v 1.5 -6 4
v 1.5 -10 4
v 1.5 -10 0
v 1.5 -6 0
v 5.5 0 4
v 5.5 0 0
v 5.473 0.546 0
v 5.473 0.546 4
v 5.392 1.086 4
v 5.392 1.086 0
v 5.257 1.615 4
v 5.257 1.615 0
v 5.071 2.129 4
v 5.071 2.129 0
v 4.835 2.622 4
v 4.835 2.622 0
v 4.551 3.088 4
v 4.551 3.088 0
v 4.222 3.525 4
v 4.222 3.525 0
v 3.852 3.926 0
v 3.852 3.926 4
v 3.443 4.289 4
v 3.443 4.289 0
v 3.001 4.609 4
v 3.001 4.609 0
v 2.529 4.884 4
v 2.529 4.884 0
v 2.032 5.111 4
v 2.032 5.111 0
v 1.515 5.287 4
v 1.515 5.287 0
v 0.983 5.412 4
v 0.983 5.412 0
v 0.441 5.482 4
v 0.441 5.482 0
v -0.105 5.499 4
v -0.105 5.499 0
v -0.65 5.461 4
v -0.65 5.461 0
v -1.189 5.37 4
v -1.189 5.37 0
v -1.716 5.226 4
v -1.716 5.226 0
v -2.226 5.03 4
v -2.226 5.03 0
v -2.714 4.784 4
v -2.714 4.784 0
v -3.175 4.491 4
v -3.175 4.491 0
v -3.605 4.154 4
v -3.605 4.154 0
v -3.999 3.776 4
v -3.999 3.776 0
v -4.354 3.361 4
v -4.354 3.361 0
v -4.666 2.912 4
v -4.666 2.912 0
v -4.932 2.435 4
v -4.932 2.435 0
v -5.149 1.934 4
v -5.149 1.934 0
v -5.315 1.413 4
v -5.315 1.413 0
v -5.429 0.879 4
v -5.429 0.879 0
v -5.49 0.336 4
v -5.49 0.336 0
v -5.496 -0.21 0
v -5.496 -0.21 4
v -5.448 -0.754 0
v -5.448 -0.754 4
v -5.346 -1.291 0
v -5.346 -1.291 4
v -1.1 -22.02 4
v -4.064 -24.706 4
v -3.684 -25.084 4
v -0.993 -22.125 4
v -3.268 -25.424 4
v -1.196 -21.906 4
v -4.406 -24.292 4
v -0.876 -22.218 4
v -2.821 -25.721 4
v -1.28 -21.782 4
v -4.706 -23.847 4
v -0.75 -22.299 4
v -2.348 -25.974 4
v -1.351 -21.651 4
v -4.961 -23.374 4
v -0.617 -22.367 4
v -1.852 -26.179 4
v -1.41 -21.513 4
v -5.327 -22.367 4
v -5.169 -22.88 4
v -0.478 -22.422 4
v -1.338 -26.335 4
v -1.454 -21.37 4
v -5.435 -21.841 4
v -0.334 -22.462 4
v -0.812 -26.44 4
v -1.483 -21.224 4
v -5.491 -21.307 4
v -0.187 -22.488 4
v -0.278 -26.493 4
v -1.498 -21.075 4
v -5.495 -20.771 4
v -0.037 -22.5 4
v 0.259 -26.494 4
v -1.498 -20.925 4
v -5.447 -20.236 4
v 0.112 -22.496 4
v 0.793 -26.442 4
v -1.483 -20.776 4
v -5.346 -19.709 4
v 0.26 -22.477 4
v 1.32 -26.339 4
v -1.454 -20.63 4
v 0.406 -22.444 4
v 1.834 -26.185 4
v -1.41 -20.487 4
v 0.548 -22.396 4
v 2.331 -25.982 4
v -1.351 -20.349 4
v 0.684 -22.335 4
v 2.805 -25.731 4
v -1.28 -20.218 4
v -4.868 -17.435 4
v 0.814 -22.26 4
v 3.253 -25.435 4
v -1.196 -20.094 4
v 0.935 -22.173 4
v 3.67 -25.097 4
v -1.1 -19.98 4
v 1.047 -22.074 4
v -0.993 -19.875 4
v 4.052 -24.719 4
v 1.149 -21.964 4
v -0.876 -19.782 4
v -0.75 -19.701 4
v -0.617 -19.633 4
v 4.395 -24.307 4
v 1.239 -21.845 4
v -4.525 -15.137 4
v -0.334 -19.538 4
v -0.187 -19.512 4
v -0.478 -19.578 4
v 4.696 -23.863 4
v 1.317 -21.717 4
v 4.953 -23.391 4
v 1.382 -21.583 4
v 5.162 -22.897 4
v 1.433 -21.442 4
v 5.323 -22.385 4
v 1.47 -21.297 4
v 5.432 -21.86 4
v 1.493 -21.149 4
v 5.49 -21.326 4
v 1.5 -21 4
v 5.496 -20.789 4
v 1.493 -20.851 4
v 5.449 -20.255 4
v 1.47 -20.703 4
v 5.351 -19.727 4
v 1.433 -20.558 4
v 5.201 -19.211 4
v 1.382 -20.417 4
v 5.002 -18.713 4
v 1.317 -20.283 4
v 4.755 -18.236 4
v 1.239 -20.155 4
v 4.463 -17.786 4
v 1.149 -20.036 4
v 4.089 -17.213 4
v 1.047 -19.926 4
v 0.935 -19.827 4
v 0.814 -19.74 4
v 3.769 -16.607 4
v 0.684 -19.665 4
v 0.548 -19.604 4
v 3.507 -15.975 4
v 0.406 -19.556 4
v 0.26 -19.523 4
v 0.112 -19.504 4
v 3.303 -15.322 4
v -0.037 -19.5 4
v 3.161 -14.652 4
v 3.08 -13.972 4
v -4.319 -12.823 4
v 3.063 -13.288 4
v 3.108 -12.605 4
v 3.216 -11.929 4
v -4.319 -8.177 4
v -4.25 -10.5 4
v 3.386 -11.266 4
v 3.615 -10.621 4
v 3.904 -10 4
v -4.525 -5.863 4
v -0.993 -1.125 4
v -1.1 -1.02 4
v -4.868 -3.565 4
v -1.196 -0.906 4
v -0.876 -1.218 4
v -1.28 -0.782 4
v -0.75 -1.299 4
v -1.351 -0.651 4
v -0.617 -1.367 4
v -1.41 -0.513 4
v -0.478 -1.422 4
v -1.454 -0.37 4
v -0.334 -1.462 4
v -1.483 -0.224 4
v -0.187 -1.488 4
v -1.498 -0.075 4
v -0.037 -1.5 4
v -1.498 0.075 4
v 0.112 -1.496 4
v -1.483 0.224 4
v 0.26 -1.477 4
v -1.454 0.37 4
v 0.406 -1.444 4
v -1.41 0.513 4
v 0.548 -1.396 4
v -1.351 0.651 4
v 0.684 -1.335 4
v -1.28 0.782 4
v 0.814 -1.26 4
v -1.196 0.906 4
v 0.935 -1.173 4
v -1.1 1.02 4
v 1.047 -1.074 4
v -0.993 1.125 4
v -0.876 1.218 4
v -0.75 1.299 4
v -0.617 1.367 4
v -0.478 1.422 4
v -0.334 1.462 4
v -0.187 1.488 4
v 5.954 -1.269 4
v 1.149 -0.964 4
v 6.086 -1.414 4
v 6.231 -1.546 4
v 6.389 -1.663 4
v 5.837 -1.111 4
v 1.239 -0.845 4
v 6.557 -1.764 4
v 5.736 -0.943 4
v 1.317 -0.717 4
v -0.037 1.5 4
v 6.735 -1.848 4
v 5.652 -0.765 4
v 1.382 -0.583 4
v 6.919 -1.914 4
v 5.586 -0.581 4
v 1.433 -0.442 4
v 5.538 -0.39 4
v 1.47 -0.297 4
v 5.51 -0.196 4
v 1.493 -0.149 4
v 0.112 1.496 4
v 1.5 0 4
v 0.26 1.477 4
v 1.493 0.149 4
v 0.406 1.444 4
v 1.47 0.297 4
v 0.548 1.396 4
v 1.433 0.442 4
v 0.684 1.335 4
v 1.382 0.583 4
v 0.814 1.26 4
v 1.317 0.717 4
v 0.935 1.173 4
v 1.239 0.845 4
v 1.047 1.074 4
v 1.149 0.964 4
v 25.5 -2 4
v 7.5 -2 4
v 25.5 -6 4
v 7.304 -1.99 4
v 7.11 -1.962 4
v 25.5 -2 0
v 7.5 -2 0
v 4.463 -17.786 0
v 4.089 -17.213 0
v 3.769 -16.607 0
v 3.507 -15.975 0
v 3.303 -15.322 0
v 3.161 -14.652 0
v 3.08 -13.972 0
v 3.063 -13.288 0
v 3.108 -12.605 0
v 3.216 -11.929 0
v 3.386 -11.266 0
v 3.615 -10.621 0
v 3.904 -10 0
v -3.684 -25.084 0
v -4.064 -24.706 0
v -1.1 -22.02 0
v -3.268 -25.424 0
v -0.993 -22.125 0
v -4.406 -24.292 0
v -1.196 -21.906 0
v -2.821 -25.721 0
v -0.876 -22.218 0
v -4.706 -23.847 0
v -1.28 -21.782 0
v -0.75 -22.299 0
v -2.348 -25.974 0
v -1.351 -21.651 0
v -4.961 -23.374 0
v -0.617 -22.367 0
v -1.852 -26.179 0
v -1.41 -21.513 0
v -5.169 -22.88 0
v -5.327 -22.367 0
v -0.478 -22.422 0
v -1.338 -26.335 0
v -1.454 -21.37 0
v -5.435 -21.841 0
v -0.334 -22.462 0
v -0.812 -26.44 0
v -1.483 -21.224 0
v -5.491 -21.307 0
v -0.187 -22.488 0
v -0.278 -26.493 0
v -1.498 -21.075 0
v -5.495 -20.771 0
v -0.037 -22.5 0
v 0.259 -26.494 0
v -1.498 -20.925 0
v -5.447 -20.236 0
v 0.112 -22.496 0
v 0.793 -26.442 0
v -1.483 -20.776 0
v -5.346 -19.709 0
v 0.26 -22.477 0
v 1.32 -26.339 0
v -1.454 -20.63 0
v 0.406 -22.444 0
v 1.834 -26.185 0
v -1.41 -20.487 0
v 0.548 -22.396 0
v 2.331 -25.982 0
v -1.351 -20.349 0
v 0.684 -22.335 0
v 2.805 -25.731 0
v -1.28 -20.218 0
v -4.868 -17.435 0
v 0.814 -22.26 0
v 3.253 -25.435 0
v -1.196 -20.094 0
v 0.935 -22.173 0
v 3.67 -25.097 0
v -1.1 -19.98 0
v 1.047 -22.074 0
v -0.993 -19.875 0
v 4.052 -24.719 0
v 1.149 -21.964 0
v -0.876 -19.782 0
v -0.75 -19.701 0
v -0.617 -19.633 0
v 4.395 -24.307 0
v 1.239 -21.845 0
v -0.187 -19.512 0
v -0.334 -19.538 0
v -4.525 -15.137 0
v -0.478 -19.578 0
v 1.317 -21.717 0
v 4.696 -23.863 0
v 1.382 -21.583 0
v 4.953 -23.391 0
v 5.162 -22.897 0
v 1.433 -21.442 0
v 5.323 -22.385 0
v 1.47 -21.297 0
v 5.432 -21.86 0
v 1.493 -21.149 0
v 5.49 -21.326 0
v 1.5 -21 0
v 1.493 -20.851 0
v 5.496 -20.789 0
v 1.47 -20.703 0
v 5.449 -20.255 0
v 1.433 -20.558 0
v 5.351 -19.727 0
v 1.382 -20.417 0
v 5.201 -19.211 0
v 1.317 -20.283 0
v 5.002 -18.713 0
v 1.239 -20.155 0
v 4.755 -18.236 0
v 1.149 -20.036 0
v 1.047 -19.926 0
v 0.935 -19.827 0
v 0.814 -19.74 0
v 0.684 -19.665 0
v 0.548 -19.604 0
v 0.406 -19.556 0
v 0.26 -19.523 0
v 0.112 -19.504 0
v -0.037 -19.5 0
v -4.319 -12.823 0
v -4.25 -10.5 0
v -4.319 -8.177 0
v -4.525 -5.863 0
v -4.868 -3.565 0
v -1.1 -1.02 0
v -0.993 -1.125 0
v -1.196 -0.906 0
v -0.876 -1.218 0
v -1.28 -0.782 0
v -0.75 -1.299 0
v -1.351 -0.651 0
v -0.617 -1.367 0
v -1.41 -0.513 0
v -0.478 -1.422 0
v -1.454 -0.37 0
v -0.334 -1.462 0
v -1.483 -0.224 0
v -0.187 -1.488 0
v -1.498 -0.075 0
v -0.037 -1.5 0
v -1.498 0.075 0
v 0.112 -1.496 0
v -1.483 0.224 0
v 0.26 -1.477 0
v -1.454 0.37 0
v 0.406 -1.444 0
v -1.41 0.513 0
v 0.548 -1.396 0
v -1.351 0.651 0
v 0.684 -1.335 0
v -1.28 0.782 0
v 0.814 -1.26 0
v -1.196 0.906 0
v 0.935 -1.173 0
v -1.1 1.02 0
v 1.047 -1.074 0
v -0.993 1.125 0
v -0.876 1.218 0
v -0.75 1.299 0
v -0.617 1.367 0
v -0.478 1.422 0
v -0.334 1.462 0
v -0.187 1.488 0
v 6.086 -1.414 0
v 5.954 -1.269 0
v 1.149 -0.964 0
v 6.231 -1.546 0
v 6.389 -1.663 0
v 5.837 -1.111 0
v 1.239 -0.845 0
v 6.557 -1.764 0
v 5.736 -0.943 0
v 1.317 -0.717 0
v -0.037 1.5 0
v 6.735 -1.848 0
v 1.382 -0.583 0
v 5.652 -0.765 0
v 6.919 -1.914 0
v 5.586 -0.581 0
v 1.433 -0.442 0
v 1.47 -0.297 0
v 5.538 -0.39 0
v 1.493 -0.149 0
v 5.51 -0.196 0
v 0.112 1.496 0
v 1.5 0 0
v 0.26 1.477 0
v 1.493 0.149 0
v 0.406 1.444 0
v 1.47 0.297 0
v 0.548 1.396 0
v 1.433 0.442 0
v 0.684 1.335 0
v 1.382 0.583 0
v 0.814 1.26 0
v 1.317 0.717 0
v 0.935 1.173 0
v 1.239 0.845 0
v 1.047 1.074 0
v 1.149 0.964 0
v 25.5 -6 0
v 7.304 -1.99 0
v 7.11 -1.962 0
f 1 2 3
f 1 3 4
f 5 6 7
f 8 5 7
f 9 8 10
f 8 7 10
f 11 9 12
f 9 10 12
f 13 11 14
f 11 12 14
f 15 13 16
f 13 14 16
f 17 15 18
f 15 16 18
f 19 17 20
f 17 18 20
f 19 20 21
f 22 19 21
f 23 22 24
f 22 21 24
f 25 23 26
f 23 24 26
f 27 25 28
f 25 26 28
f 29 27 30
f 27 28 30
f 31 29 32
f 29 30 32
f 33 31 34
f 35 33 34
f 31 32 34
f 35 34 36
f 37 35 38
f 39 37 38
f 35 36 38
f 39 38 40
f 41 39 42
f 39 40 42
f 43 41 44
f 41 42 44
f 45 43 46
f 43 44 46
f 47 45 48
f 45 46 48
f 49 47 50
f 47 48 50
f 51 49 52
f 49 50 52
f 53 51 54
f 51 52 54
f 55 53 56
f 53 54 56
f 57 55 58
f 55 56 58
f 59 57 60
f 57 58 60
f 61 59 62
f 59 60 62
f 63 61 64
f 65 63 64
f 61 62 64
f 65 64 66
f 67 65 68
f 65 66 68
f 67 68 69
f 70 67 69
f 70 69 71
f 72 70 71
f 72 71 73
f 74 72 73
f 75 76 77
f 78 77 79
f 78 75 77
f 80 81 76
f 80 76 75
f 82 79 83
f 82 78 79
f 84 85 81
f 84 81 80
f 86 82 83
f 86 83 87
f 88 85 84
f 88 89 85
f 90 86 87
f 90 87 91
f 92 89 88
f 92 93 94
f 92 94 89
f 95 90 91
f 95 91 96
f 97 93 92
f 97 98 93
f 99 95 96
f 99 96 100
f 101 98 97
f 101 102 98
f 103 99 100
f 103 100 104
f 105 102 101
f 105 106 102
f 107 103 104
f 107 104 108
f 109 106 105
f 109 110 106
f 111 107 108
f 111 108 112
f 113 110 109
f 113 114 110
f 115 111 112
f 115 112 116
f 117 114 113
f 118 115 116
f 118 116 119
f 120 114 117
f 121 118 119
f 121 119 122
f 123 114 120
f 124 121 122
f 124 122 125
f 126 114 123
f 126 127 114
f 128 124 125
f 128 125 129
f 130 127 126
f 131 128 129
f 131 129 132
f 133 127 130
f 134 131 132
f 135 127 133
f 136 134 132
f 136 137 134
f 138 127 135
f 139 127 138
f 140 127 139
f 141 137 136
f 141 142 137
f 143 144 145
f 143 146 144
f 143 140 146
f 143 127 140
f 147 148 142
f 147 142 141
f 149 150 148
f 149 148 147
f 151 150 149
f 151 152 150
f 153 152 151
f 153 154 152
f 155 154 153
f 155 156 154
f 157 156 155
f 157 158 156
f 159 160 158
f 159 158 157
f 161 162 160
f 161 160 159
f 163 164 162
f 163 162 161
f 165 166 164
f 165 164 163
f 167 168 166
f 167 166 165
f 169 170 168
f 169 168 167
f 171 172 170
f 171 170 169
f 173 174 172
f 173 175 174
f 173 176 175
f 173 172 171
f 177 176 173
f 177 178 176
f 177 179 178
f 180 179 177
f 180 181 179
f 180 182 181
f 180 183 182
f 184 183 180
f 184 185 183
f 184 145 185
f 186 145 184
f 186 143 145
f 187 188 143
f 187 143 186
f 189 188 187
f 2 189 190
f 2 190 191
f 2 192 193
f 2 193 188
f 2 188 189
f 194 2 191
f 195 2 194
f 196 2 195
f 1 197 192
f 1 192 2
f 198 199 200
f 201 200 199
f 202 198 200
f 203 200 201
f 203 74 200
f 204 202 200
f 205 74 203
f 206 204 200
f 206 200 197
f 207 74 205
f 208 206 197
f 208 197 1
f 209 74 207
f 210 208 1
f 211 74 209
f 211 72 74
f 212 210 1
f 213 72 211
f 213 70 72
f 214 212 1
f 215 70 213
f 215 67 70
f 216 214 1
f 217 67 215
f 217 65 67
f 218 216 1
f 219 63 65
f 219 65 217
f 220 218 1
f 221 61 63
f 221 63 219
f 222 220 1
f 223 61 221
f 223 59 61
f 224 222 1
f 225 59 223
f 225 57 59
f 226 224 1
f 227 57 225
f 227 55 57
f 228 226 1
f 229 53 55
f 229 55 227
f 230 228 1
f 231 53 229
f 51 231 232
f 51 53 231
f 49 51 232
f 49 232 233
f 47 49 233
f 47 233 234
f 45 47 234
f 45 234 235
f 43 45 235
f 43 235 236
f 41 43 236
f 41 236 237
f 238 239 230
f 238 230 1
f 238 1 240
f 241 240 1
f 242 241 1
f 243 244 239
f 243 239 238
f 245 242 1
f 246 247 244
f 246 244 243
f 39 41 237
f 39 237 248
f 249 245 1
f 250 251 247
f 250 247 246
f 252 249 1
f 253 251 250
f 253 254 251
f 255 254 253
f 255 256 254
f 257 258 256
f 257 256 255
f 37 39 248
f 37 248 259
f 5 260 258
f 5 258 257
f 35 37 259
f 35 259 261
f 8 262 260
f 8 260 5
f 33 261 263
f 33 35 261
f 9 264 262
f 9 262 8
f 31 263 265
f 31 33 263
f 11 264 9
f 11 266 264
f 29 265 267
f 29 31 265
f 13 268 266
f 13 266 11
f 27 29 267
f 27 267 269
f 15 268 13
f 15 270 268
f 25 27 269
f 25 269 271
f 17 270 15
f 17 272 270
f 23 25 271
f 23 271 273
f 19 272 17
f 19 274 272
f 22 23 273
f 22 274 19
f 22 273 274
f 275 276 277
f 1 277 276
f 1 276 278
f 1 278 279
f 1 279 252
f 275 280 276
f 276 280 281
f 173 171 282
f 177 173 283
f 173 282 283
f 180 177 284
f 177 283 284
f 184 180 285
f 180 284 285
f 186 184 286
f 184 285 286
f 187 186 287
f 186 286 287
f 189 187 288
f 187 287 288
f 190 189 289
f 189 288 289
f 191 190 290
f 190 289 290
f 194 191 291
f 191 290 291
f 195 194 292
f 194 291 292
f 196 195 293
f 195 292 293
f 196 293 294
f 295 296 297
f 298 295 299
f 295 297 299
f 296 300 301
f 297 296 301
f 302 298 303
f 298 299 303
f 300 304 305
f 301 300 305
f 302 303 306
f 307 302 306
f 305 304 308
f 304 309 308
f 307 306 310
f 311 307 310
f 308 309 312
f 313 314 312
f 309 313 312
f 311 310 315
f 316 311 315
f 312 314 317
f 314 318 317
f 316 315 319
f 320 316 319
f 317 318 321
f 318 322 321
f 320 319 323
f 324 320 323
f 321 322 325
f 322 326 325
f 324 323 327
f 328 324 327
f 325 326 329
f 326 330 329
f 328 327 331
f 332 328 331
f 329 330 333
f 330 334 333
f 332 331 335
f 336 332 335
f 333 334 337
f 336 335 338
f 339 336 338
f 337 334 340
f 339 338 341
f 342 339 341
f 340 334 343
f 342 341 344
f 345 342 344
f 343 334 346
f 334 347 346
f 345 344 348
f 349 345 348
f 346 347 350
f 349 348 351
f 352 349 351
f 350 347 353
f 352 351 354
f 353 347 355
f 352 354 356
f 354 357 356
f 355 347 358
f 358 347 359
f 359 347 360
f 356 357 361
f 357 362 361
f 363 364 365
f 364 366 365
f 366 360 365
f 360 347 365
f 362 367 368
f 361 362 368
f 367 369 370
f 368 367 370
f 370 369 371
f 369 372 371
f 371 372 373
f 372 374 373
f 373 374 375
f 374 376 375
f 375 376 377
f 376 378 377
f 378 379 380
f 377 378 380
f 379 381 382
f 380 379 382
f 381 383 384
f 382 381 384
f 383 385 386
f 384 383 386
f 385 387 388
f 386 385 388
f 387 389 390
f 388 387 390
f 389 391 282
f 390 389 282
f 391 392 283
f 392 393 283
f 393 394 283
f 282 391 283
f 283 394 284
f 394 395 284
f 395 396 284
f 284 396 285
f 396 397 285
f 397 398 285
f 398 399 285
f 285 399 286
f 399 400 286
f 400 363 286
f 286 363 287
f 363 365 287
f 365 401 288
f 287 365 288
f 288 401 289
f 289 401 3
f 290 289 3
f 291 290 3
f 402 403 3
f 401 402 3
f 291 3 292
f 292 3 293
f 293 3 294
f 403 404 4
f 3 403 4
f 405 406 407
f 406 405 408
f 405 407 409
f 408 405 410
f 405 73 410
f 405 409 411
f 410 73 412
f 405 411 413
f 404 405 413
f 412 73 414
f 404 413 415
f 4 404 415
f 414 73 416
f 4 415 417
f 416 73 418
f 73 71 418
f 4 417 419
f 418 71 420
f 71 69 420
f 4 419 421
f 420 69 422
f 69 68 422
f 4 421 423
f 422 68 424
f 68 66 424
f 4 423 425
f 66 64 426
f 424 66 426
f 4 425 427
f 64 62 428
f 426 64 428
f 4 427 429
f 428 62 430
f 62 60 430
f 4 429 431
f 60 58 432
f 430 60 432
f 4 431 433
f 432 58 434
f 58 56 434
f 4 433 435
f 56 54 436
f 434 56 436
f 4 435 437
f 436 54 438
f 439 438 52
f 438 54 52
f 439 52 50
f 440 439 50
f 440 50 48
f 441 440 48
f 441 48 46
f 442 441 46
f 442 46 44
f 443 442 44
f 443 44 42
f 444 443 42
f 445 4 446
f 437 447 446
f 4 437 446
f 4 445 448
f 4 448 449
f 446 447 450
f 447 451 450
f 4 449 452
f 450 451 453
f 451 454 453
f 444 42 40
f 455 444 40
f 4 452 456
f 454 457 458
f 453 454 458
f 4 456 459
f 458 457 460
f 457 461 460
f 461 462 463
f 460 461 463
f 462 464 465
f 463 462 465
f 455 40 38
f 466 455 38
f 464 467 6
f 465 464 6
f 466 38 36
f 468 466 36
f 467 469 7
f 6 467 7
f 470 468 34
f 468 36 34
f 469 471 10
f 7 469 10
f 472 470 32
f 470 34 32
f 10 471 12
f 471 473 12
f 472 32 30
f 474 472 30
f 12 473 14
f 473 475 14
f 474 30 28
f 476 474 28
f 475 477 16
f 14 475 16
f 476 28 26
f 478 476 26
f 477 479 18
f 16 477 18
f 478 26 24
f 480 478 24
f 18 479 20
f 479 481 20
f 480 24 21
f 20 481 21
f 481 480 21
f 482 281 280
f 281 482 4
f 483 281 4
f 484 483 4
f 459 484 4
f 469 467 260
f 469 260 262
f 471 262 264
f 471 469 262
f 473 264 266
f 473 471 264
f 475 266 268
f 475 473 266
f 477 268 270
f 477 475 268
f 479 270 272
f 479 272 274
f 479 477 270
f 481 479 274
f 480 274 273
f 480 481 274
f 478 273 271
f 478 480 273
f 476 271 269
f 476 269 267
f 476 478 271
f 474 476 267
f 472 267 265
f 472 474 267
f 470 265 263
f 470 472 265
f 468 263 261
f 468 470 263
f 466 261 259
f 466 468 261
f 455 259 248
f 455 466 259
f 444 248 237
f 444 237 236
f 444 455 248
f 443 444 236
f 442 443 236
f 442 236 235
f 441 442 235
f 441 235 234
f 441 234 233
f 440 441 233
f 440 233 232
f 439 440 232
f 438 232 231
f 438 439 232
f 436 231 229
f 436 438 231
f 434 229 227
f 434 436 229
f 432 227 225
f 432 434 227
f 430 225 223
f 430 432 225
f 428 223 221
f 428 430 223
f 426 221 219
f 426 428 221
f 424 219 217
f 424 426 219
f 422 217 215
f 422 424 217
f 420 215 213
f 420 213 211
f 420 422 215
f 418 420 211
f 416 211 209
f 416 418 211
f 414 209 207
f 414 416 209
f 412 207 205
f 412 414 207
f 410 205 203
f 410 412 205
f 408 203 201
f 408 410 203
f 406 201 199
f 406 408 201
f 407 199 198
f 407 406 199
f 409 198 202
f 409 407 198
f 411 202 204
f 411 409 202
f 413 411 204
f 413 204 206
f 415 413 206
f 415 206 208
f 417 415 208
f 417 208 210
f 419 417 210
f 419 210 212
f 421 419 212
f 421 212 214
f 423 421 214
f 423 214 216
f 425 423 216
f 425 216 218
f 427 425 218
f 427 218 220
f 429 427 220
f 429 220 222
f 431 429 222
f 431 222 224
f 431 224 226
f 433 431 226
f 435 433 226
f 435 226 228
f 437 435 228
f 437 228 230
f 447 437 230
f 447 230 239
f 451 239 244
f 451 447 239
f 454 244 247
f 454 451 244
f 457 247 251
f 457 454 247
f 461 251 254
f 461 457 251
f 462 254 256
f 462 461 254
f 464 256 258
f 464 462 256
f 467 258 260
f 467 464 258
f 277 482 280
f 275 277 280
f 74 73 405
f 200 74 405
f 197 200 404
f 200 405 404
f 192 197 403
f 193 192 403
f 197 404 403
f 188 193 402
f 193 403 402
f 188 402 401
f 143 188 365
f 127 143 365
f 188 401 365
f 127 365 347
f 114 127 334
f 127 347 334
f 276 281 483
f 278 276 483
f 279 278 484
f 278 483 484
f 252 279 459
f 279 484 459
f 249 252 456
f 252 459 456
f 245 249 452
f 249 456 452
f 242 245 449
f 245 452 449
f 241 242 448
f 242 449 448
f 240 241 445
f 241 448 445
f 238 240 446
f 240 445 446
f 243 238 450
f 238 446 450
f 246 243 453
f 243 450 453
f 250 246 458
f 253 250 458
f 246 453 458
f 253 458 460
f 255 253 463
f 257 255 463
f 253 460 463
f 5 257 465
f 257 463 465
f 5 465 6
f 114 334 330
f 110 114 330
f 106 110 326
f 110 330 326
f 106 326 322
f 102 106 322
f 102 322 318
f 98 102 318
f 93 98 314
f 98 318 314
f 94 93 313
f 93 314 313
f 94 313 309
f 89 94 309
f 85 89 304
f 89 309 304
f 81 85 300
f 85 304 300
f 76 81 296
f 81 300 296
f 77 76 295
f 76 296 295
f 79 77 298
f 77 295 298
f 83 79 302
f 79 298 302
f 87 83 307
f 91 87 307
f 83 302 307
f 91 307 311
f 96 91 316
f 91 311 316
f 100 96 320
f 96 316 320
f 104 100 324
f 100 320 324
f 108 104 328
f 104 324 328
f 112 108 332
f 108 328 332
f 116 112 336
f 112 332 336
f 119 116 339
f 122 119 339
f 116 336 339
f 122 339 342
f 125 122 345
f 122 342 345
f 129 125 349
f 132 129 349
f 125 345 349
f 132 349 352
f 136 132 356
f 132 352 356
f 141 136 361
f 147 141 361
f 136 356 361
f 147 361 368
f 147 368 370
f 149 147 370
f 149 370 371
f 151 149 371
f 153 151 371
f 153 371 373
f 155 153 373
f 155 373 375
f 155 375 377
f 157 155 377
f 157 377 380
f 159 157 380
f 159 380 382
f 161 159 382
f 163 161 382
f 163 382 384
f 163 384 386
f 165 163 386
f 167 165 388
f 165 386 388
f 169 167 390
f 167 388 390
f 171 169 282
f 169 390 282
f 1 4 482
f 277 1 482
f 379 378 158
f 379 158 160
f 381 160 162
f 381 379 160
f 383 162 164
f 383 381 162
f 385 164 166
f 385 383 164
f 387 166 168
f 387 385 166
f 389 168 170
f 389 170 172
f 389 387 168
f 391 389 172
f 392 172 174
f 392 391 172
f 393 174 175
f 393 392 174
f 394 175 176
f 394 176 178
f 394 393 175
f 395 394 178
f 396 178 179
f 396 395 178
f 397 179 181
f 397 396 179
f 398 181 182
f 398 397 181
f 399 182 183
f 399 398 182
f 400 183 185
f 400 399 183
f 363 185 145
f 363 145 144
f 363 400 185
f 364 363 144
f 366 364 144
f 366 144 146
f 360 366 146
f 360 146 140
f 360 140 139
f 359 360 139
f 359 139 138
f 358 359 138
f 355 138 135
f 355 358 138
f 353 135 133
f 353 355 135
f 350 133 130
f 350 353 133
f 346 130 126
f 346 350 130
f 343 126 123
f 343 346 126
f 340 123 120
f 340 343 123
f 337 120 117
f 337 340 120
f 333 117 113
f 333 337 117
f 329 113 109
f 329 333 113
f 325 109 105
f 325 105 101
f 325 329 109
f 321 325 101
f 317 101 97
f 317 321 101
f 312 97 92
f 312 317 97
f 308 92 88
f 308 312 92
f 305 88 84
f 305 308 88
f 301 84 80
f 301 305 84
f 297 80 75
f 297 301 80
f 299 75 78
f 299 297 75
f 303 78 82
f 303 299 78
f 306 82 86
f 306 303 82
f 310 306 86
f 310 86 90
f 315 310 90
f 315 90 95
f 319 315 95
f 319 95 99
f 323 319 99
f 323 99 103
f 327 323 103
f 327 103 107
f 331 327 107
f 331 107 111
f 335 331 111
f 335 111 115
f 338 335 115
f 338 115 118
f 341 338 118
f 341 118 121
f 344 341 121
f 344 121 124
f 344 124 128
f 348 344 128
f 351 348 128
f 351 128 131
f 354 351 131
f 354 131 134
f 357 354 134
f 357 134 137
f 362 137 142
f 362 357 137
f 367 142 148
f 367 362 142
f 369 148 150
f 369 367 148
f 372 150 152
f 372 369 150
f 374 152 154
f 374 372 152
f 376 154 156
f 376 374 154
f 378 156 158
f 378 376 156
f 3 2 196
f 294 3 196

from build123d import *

# Parameters (mm, degrees)
SKETCH1_R           = 1.5
BOSS_EXTRUDE1_DEPTH = 4
SKETCH2_W           = 24
SKETCH2_H           = 4
CUT_EXTRUDE1_DEPTH  = 10


with BuildPart() as part:
    # Sketch1 → Boss-Extrude1 (new body)
    with BuildSketch(Plane.XY):
        with BuildLine():
            Line((25.5, -2), (7.5, -2))
            ThreePointArc((7.5, -2), (6.085786438, -1.414213562), (5.5, 0))
            ThreePointArc((5.5, 0), (-0.650170894, 5.461435508), (-5.34628284, -1.291224148))
            ThreePointArc((-5.34628284, -1.291224148), (-4.25, -10.5), (-5.34628284, -19.708775852))
            ThreePointArc((-5.34628284, -19.708775852), (1.057902641, -26.39729951), (4.463242224, -17.786050895))
            ThreePointArc((4.463242224, -17.786050895), (3.8789457, -10.047752676), (10.5, -6))
            Line((10.5, -6), (25.5, -6))
            Line((25.5, -6), (25.5, -2))
        make_face()
        Circle(SKETCH1_R, mode=Mode.SUBTRACT)
        with Locations((0, -21)):
            Circle(SKETCH1_R, mode=Mode.SUBTRACT)
    extrude(amount=BOSS_EXTRUDE1_DEPTH)

    # Sketch2 → Cut-Extrude1 (cut)
    with BuildSketch(Plane.XY.offset(4)):
        with Locations((13.5, -8)):
            Rectangle(SKETCH2_W, SKETCH2_H)
    extrude(amount=-CUT_EXTRUDE1_DEPTH, mode=Mode.SUBTRACT)


solid = part.part
